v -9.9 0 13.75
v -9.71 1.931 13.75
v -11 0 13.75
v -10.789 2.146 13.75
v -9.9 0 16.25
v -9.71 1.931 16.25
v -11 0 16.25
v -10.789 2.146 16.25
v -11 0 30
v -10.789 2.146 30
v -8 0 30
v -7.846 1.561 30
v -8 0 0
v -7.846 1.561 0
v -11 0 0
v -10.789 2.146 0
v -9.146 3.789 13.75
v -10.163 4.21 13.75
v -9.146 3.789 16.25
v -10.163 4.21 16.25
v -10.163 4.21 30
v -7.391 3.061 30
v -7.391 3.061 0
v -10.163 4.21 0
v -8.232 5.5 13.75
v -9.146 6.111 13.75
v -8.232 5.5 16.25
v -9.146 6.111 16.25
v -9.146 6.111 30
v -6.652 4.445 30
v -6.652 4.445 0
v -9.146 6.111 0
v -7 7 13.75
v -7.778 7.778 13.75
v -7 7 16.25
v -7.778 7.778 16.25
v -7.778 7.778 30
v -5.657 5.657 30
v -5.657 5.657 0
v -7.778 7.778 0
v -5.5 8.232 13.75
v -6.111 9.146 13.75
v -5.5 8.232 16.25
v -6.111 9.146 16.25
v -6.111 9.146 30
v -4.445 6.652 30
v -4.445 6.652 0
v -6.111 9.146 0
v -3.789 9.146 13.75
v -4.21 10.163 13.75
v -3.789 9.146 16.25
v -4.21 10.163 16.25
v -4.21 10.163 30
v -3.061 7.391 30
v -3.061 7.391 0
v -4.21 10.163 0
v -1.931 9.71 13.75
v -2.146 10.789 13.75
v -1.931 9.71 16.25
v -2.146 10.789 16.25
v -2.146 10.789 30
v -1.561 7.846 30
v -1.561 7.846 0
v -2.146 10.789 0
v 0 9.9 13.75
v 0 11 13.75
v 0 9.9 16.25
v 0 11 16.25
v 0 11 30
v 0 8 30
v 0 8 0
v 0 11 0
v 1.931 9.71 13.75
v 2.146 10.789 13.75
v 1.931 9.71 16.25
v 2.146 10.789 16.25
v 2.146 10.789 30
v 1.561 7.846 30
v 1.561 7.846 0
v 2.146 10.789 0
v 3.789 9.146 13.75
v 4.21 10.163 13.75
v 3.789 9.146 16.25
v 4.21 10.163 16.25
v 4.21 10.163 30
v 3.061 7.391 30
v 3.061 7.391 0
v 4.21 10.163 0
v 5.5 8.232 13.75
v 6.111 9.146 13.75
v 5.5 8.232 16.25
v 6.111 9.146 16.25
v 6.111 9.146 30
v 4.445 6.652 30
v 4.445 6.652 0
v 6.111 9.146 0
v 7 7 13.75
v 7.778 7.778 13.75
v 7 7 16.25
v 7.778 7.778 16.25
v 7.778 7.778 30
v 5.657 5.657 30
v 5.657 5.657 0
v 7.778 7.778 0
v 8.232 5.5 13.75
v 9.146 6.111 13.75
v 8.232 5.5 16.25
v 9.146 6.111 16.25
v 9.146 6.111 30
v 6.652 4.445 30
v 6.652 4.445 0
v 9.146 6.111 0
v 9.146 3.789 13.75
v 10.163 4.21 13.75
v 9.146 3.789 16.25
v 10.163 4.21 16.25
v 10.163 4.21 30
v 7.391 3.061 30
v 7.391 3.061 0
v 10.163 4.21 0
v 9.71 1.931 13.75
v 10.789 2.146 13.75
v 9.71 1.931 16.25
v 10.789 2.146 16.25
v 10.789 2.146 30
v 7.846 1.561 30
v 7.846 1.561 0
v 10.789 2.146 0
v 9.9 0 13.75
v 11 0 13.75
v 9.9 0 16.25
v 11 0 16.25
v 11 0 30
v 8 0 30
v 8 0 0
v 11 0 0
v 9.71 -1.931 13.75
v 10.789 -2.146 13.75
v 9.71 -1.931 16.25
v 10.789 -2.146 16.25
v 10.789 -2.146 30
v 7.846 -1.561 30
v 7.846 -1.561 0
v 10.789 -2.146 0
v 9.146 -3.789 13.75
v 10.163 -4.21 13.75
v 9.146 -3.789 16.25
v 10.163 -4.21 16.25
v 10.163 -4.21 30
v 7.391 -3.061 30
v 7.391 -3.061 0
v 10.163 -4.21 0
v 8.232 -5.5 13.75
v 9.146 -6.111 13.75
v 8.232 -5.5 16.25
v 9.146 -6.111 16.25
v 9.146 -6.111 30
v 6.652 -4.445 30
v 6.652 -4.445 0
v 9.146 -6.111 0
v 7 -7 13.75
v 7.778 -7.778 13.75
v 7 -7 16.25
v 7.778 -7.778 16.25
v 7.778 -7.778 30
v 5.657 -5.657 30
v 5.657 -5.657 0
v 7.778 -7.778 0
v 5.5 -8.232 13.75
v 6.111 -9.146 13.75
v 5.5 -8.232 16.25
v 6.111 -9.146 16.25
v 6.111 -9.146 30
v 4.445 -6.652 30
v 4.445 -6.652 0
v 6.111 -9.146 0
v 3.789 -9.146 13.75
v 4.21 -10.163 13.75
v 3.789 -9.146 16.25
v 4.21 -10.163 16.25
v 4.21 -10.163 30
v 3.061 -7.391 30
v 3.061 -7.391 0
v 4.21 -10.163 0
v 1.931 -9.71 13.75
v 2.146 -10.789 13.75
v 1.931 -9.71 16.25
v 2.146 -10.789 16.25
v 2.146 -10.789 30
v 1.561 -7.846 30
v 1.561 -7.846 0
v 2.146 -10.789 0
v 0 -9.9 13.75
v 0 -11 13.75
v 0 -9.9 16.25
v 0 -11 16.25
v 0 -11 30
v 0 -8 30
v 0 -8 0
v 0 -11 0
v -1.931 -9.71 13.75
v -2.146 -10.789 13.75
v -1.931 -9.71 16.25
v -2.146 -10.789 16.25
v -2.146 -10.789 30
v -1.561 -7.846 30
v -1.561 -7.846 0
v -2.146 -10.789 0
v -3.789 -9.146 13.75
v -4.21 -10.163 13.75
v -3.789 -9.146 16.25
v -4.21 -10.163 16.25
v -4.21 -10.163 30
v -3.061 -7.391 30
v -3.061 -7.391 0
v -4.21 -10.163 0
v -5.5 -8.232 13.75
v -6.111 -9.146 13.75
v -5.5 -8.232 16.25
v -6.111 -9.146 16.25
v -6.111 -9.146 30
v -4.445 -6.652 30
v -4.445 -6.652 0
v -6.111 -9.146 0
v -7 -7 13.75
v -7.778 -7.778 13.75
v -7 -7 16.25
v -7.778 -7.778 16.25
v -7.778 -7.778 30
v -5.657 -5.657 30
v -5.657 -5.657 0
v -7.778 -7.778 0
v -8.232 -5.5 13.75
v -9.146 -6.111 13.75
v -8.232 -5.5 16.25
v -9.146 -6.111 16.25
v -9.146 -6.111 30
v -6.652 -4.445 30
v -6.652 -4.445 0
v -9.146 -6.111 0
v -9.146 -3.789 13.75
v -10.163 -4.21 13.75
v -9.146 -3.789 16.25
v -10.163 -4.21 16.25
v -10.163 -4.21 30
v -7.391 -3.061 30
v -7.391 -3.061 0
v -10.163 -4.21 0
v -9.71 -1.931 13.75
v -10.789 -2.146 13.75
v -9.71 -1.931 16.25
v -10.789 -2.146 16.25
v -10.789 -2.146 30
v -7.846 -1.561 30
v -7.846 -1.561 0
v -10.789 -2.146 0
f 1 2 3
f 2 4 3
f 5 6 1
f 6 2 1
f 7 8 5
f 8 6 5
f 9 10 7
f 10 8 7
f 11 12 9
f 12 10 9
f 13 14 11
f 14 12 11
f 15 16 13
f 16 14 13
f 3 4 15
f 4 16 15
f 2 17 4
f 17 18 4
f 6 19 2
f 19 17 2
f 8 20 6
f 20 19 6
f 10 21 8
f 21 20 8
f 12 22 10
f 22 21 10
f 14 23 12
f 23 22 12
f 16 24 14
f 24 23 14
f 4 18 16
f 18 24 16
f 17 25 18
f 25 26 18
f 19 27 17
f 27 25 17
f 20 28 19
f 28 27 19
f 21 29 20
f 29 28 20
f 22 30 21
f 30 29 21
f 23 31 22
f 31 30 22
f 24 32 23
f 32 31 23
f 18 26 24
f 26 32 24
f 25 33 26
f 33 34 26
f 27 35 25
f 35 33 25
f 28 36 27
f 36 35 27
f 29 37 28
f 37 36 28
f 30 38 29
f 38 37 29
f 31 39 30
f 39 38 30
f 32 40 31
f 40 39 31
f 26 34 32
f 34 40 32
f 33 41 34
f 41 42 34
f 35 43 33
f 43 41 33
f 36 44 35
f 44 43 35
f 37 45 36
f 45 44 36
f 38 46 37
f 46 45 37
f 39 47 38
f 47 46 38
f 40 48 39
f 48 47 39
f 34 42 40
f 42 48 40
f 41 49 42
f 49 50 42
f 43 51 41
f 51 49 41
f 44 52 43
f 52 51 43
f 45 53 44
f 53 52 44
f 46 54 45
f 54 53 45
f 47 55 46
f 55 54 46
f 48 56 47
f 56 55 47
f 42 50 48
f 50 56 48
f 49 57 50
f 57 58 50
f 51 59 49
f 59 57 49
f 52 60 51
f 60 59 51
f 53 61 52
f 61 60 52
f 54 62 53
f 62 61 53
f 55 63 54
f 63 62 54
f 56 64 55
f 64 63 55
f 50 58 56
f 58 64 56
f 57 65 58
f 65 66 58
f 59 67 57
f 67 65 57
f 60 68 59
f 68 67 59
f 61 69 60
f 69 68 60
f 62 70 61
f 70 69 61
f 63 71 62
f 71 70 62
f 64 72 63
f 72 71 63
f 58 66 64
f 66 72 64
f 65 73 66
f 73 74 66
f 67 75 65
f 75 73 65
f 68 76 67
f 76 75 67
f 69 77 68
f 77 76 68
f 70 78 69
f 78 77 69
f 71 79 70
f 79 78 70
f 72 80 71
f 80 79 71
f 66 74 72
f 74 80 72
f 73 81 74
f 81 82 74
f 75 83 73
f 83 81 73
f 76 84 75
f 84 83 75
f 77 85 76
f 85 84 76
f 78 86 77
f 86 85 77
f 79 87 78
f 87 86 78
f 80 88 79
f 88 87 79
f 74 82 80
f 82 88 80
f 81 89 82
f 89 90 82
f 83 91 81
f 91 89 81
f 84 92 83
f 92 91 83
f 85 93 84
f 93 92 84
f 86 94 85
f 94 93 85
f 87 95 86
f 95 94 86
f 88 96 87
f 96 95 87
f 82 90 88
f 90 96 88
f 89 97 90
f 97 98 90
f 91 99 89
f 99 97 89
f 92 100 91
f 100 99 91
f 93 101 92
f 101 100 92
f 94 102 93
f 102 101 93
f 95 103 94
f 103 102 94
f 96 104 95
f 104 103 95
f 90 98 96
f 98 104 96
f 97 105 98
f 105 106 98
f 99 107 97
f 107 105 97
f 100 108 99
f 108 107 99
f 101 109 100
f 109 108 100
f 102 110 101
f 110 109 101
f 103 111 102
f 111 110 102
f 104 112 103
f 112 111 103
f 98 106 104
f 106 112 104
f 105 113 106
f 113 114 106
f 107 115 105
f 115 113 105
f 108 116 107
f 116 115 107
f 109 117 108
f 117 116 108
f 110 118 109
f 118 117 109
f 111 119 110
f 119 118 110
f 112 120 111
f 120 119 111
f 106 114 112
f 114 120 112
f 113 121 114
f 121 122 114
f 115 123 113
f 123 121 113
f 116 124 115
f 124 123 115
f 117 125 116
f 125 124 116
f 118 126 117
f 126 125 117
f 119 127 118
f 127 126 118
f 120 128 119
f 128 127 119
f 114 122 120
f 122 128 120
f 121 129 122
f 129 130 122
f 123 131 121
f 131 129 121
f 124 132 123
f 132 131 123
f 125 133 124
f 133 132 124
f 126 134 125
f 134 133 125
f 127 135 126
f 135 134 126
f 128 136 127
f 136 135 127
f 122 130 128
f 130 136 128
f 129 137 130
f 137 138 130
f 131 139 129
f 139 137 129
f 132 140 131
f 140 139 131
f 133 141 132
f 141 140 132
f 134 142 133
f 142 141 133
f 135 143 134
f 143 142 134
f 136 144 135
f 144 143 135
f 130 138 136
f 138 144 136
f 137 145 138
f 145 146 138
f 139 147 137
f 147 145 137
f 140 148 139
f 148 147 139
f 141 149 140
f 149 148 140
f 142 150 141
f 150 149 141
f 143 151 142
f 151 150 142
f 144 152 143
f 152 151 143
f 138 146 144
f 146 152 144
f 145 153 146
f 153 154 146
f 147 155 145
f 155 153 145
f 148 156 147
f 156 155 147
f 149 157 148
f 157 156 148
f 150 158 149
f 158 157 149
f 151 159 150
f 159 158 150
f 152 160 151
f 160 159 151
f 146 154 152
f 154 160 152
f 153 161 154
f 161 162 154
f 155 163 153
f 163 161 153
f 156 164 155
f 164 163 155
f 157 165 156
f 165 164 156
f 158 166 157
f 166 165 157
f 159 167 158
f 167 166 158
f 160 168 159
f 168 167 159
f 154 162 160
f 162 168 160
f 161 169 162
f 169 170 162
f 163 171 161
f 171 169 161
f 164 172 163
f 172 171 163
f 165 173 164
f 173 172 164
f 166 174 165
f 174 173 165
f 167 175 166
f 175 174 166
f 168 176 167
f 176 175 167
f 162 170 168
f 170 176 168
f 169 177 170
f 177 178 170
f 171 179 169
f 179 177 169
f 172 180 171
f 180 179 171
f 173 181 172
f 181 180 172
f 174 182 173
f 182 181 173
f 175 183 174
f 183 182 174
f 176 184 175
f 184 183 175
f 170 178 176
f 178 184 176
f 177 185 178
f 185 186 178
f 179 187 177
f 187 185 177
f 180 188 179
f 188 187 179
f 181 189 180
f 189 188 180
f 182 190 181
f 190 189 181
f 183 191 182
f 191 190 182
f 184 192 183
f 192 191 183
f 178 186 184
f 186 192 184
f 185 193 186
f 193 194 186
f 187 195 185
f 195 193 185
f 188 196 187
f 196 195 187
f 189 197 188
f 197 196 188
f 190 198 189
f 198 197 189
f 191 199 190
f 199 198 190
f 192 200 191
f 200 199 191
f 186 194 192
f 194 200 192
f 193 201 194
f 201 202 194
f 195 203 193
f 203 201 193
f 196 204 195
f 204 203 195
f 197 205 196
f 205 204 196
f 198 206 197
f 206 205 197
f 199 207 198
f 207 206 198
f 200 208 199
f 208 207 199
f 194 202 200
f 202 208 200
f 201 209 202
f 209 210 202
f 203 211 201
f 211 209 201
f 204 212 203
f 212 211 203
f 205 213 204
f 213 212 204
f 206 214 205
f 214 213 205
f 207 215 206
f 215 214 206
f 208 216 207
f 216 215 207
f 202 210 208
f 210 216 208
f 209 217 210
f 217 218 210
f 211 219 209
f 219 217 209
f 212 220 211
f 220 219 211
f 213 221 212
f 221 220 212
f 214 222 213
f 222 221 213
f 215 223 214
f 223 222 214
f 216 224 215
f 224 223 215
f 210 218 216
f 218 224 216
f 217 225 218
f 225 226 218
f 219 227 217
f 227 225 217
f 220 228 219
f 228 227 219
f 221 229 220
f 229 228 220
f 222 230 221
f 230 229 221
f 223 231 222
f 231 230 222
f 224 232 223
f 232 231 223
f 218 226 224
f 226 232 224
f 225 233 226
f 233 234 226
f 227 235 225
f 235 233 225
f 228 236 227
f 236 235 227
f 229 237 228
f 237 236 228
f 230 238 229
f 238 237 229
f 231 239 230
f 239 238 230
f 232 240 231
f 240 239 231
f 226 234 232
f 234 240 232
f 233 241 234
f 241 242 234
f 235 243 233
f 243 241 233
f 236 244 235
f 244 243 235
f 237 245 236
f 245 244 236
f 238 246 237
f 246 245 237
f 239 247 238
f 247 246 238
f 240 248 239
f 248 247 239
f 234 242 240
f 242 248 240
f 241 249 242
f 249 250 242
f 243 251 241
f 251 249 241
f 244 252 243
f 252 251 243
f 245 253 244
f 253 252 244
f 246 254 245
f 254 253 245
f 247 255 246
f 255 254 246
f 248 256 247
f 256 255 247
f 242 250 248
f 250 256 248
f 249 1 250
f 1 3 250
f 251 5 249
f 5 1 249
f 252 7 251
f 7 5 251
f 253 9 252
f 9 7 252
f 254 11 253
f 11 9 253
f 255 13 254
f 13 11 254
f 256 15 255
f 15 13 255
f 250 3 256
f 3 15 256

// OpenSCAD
$fn = 32;

// ----------------------------------------------------------------------
// Grooved revolve: stepped, bore R8
// ----------------------------------------------------------------------

// --- parameters (mm) ---
bore_r = 8;               // bore radius
outer_r = 11;             // outer radius of the body
total_h = 30;             // overall height, Z
wall = 3;                 // radial wall thickness
groove_w = 2.5;           // groove width
groove_d = 1.1;           // groove depth
grooves = 1;              // number of outer grooves
fit_tol = 0.1;            // declared fit tolerance (prompt contract)
free_tol = 0.3;           // declared free tolerance (prompt contract)

bbox_x = 2 * outer_r;  // full diameter
bore_d = 2 * bore_r;  // bore diameter
body_d = 2 * outer_r;  // body diameter
revolve_angle = 360;  // full turn around the Z axis

profile = [[8, 0], [11, 0], [11, 13.75], [9.9, 13.75], [9.9, 16.25], [11, 16.25], [11, 30], [8, 30]];  // primary outline, 8 points, counter clockwise

// --- the one profile operation ---
rotate_extrude(angle = revolve_angle) polygon(points = profile);
